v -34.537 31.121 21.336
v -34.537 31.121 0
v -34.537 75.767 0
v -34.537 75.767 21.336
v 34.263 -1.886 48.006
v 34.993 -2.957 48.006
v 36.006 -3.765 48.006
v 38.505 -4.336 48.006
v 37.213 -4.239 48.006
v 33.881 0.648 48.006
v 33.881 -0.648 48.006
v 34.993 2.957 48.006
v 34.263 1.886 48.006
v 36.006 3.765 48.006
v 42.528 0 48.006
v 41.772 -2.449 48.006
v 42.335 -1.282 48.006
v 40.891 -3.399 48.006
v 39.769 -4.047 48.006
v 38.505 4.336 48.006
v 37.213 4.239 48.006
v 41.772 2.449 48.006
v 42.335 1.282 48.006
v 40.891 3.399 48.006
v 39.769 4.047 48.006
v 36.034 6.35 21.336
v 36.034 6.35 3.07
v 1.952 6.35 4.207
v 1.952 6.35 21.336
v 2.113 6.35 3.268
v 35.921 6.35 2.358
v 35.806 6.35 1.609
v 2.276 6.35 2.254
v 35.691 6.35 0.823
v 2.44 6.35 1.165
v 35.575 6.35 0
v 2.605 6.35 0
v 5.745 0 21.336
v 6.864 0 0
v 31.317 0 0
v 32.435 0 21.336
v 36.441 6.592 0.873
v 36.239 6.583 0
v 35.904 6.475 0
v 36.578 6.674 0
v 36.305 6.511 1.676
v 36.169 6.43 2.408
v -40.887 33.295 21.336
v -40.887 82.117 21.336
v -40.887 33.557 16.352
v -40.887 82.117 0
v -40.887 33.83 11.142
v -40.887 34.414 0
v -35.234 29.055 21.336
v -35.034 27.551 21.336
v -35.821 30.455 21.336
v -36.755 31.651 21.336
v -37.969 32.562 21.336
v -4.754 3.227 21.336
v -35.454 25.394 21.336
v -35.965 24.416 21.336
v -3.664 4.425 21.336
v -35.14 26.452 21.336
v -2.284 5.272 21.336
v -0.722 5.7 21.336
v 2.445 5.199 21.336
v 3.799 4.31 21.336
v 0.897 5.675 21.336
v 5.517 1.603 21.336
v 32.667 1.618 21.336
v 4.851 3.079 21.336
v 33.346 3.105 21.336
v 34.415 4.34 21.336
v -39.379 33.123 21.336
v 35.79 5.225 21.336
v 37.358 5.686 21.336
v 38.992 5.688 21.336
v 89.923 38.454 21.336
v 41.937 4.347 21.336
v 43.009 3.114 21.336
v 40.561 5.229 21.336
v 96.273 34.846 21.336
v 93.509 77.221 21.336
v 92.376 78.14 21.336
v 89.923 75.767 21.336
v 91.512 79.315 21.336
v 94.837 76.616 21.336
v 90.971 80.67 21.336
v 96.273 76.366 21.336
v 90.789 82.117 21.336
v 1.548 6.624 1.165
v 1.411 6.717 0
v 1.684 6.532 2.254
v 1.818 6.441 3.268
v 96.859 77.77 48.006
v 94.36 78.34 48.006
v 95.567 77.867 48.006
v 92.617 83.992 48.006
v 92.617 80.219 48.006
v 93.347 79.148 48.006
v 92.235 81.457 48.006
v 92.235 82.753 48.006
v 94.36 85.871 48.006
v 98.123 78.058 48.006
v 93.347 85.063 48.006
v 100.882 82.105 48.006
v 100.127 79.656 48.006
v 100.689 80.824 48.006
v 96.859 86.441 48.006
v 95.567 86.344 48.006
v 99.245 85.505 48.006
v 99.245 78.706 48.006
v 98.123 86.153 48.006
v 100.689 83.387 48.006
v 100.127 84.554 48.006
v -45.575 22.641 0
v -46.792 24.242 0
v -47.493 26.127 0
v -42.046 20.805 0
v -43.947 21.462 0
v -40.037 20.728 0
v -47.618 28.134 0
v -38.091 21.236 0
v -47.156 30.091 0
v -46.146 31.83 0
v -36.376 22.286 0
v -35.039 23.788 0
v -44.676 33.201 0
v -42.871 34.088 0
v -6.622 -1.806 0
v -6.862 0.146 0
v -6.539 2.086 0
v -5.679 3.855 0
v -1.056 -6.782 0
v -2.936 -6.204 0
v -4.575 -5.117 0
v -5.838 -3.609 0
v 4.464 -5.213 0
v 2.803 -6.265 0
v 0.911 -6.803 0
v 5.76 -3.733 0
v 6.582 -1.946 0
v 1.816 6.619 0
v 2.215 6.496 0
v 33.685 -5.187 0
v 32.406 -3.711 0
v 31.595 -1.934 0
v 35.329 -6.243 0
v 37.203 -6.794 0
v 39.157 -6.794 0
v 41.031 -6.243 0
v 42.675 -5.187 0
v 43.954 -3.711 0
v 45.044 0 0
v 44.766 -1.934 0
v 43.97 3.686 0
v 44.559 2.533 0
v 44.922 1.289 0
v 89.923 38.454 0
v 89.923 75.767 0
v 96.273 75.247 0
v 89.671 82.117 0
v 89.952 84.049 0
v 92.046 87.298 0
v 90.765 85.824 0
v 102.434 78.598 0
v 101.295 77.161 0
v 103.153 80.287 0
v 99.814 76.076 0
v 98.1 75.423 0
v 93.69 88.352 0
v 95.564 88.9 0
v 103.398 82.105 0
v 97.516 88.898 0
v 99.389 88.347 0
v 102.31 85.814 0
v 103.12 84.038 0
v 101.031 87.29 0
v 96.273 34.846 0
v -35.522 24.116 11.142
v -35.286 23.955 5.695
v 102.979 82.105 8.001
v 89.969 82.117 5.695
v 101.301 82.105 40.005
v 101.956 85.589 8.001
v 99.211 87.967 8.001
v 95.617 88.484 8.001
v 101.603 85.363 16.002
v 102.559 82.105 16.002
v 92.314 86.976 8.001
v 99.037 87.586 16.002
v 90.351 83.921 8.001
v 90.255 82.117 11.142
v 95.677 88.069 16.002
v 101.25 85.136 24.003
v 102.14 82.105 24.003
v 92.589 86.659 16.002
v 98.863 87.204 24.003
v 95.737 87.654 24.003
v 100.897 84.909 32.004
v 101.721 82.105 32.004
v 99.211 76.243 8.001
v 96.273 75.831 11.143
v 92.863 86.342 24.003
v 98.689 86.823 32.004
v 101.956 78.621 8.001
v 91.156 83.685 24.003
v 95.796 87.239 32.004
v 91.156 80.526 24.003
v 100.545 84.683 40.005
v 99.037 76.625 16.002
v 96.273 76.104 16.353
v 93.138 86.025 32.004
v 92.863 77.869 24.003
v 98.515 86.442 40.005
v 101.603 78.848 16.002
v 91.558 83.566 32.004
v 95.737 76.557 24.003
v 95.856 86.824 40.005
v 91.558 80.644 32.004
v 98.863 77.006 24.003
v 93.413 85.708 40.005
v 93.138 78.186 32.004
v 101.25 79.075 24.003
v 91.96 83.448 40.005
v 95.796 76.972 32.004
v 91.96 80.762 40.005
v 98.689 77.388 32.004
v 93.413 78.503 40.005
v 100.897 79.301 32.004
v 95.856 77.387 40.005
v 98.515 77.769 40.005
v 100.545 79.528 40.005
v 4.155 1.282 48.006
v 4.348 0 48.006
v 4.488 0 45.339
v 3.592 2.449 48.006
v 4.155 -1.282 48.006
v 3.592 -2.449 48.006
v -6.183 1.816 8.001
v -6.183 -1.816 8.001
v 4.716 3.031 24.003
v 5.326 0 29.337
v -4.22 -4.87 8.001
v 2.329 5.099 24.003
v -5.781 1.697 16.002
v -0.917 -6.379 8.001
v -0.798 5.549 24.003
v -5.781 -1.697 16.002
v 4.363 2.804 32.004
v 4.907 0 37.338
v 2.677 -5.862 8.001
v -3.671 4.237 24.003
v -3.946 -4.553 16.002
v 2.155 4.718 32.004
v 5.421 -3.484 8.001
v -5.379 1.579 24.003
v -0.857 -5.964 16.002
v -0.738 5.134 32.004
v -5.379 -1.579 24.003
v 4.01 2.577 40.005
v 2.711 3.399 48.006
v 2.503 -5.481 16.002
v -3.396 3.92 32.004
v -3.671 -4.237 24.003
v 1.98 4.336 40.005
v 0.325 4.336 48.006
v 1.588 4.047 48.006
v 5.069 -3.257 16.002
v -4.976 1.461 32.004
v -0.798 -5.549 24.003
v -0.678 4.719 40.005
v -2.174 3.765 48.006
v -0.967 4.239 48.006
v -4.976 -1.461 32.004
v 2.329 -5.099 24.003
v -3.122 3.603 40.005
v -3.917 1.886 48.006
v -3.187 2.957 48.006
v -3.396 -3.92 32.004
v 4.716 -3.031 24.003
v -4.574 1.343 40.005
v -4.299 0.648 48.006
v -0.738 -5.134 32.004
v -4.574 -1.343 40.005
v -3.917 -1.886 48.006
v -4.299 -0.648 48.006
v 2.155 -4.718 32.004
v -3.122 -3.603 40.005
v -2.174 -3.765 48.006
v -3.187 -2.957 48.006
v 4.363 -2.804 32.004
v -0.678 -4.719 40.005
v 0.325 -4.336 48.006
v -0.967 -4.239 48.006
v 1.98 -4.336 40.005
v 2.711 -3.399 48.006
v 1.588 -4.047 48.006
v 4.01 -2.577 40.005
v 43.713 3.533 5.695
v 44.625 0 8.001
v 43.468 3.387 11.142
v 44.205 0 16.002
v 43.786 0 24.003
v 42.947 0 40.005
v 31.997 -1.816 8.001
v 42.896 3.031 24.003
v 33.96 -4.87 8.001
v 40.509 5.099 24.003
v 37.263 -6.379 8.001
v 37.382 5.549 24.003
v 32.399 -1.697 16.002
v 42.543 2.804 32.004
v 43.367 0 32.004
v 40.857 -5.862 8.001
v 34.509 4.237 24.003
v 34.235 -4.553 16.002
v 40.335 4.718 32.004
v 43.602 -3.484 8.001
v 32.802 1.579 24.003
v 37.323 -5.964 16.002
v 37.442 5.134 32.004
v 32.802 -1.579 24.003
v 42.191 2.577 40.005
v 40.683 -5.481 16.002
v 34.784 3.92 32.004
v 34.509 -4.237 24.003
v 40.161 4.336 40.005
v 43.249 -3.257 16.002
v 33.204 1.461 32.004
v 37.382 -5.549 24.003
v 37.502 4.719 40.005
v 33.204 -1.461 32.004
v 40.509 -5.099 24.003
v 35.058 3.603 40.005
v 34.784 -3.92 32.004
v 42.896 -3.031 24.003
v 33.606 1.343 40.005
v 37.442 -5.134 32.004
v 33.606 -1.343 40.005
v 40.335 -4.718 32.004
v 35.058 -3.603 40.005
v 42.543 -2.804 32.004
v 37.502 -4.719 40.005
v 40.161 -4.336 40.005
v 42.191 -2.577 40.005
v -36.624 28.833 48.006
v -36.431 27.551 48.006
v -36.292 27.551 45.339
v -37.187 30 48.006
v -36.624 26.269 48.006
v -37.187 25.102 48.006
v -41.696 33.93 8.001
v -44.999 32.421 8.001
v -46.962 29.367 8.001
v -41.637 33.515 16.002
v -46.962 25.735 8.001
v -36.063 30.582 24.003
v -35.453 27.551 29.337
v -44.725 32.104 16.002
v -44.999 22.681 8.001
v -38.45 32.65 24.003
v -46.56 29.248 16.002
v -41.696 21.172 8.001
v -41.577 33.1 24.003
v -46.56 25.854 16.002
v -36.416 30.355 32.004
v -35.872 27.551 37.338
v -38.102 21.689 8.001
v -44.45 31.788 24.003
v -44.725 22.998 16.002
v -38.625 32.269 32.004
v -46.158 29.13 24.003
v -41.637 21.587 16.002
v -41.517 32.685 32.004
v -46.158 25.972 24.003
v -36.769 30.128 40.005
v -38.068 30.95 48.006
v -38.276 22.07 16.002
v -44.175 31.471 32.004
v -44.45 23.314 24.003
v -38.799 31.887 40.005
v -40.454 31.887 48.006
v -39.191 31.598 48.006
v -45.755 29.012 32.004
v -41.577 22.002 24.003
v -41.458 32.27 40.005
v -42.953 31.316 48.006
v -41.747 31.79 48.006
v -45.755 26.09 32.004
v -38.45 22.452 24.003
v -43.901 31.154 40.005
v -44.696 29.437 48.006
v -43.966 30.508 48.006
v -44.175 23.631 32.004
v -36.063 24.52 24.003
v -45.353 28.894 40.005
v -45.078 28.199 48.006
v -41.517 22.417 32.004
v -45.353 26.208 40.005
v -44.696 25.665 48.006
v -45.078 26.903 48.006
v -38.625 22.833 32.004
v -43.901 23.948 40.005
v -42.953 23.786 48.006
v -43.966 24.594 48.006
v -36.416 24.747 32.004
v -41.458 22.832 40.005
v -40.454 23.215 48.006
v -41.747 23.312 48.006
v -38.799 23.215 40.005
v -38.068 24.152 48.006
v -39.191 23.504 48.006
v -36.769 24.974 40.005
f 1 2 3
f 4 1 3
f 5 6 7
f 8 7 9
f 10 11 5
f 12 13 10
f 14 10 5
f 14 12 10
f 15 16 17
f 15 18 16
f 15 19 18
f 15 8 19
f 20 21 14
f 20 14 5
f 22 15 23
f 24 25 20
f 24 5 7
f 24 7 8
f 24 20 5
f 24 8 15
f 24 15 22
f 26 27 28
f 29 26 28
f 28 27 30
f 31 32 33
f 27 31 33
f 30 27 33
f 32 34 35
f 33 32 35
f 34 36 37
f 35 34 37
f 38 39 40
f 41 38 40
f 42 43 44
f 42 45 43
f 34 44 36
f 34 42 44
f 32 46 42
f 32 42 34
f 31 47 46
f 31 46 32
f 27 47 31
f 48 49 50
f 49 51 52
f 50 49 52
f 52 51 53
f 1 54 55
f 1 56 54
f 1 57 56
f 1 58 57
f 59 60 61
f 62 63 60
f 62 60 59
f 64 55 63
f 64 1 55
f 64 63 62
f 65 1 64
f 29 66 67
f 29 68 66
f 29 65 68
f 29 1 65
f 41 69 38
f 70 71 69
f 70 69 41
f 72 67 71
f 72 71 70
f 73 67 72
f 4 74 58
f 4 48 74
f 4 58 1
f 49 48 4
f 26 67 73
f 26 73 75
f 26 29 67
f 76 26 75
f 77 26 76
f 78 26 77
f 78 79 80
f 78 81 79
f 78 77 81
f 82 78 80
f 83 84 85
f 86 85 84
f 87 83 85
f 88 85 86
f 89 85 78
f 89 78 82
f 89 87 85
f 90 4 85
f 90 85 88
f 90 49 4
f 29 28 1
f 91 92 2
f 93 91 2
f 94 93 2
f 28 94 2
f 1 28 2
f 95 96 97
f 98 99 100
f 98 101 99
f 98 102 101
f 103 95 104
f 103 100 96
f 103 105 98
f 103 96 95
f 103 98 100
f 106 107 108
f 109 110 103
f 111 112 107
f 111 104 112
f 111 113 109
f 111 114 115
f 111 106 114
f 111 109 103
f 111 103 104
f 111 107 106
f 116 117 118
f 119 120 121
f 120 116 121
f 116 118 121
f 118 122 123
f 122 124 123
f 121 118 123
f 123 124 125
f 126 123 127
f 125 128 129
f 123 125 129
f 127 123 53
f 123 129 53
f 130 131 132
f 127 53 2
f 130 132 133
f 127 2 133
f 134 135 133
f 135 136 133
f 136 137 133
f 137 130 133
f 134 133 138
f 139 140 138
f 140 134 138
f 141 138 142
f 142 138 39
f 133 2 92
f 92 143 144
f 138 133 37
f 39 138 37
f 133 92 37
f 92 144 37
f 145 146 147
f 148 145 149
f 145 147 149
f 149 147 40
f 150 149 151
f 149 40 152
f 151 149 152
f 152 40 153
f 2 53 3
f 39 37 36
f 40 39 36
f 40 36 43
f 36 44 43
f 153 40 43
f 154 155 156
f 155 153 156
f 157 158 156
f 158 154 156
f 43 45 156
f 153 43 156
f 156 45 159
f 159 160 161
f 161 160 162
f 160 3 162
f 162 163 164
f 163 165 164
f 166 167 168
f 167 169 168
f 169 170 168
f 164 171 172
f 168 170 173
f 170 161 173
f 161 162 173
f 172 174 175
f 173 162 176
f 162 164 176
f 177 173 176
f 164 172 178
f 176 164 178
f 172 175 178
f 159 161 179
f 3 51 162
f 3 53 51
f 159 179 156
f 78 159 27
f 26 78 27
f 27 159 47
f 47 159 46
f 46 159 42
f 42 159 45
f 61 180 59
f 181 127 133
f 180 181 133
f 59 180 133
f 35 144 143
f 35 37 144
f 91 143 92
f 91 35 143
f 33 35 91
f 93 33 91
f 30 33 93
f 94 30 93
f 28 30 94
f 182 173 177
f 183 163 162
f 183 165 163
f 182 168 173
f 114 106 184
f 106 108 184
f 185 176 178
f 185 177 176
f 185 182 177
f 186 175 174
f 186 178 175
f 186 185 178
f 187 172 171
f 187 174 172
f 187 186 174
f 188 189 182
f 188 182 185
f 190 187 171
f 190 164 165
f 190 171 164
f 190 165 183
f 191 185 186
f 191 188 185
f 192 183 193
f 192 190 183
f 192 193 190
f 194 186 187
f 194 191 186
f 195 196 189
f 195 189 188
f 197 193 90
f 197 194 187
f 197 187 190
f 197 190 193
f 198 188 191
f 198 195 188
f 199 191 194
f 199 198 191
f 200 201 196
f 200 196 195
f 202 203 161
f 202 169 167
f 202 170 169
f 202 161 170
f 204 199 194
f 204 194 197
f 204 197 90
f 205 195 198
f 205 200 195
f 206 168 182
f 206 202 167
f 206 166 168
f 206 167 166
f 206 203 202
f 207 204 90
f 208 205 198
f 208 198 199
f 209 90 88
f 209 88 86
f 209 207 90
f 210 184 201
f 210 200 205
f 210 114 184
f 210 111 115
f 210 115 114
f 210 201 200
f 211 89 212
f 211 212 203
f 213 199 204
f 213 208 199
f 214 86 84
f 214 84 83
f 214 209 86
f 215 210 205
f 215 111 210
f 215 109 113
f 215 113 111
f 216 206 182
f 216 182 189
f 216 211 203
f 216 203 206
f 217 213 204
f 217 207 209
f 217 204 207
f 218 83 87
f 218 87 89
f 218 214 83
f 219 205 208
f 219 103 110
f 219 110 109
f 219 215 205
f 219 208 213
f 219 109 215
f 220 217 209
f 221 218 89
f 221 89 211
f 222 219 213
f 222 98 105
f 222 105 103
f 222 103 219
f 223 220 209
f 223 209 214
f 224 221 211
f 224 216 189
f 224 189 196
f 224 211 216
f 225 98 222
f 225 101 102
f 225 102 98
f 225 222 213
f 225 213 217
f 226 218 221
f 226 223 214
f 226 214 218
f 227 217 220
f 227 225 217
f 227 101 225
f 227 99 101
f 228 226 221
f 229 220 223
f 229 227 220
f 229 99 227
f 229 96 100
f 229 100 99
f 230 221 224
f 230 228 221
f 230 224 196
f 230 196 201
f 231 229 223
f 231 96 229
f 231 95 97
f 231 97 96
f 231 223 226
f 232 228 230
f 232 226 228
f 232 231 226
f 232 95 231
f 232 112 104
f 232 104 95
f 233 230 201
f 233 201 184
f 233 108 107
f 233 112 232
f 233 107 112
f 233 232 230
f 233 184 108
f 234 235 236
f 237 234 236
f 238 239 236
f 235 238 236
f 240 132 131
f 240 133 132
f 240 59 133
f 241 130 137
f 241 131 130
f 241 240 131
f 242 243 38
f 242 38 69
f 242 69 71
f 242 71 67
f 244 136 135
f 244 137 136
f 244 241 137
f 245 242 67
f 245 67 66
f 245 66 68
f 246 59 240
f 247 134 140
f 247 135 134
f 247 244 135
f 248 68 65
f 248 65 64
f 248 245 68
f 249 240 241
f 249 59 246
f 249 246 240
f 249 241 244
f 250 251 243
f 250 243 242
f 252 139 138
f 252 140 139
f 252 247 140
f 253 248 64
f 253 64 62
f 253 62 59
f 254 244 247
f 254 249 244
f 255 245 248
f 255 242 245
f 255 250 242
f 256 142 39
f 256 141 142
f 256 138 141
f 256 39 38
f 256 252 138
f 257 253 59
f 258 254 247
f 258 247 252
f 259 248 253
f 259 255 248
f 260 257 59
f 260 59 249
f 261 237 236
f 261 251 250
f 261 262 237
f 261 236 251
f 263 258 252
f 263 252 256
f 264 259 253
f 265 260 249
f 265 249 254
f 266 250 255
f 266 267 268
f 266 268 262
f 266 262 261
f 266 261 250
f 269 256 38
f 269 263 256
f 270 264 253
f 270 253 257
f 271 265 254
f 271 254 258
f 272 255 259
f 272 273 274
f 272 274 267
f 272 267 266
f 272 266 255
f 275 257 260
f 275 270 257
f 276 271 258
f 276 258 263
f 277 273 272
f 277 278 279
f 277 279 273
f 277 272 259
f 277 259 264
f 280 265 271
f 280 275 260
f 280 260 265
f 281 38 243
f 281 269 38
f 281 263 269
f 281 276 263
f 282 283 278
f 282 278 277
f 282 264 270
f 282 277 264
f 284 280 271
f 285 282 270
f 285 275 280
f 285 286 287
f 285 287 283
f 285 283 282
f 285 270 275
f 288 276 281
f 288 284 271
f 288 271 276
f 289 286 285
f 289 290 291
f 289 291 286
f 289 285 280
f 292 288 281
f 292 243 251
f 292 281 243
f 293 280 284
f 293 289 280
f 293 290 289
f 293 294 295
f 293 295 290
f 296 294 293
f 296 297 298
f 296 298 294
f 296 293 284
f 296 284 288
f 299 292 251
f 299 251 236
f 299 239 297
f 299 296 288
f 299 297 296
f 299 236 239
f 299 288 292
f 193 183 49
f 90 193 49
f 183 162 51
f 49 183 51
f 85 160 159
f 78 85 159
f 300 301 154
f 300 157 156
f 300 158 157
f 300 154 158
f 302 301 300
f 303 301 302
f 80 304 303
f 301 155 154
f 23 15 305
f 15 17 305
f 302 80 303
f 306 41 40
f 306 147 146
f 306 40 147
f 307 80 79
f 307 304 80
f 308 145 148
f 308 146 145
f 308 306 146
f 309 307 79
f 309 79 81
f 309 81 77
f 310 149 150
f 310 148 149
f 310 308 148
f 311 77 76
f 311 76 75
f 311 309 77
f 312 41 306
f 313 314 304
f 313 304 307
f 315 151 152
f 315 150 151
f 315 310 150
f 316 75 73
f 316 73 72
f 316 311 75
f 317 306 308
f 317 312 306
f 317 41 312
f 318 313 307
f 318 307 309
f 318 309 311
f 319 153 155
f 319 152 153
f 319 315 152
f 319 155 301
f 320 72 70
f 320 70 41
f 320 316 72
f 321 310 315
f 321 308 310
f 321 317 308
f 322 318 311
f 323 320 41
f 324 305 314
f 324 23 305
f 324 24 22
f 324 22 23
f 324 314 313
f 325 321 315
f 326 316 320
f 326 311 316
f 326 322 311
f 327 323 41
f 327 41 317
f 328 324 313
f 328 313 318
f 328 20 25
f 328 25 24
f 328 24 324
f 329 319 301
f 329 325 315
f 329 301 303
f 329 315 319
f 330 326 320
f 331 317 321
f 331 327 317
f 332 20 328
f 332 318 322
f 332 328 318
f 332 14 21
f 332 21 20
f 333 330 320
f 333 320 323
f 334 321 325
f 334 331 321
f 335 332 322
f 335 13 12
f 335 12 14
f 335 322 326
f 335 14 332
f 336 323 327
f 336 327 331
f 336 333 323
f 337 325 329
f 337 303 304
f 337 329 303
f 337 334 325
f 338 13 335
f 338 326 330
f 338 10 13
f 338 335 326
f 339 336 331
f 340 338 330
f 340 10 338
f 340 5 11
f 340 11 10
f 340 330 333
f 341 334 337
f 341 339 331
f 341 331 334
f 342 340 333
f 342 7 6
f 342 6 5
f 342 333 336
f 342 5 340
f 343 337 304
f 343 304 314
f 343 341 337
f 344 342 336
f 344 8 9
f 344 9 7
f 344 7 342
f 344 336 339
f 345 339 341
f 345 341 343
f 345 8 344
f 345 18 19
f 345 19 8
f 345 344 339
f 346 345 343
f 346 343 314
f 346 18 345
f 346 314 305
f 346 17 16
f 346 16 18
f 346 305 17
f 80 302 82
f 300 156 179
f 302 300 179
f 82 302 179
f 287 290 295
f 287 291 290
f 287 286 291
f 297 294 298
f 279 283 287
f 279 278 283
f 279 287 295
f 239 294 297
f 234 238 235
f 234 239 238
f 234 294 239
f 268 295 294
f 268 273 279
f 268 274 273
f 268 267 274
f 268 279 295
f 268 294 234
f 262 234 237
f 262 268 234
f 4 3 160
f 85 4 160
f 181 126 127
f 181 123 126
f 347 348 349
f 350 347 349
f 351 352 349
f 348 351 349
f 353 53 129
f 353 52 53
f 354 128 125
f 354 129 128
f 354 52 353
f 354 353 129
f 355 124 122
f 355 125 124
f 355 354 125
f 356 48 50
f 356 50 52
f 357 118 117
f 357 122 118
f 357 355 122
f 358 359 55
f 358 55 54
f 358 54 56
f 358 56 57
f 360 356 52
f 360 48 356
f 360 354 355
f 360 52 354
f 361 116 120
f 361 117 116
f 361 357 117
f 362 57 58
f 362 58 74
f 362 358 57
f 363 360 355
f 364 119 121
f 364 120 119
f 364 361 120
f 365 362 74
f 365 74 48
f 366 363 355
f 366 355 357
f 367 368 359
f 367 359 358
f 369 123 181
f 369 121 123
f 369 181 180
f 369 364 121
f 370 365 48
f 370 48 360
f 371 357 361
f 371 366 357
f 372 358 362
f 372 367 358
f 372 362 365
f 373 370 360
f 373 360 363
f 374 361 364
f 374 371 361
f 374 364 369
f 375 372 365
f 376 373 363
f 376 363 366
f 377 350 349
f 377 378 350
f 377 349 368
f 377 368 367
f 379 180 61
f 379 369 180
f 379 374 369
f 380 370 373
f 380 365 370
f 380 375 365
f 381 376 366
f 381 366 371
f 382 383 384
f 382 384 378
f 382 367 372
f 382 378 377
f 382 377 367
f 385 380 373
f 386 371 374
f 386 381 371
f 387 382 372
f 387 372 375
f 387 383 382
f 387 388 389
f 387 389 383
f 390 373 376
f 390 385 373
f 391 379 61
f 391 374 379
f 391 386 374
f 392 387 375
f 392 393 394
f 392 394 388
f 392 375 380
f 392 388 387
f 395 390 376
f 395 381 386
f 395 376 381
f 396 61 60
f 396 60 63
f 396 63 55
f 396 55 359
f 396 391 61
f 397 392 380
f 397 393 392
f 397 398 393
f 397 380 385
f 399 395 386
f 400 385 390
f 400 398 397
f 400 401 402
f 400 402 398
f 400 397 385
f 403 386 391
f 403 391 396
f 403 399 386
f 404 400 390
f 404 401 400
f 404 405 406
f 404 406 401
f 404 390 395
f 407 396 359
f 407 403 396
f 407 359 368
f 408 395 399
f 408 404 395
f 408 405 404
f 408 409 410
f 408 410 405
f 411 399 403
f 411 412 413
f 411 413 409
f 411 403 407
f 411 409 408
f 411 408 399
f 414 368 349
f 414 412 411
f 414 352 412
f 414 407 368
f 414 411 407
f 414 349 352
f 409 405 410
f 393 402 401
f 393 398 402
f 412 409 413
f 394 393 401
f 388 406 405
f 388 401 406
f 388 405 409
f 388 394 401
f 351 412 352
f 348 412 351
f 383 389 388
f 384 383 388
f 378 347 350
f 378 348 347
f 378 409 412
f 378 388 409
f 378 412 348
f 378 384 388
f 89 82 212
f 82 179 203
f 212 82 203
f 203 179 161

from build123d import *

# Parameters (mm, degrees)
F1_DEPTH = 21.336
F2_R     = 6.8636528609
F3_DEPTH = 48.006
F3_TAPER = 3


with BuildPart() as f1:
    # F0 (on Top) → F1 (new body)
    with BuildSketch(Plane.XY):
        Polygon((96.2734487839, 82.116805017), (-40.8865512161, 82.116805017), (-40.8865512161, 27.7571524011), (0, 0), (37.7825030637, 0), (96.2734487839, 34.8460475412), align=None)
        Polygon((89.9234488606, 75.7668050937), (89.9234488606, 38.4544916451), (36.0343505215, 6.3499999233), (1.9518097804, 6.3499999233), (-34.5365512928, 31.1212992638), (-34.5365512928, 75.7668050937), align=None, mode=Mode.SUBTRACT)
    extrude(amount=F1_DEPTH)

    # F2 (on Top) → F3 (join)
    with BuildSketch(Plane.XY):
        Circle(F2_R)
        with Locations((38.1801947951, 0)):
            Circle(F2_R)
        with Locations((96.5343341231, 82.1052864194)):
            Circle(F2_R)
        with Locations((-40.7790951431, 27.5509990752)):
            Circle(F2_R)
    extrude(amount=F3_DEPTH, taper=F3_TAPER)


solid = f1.part
